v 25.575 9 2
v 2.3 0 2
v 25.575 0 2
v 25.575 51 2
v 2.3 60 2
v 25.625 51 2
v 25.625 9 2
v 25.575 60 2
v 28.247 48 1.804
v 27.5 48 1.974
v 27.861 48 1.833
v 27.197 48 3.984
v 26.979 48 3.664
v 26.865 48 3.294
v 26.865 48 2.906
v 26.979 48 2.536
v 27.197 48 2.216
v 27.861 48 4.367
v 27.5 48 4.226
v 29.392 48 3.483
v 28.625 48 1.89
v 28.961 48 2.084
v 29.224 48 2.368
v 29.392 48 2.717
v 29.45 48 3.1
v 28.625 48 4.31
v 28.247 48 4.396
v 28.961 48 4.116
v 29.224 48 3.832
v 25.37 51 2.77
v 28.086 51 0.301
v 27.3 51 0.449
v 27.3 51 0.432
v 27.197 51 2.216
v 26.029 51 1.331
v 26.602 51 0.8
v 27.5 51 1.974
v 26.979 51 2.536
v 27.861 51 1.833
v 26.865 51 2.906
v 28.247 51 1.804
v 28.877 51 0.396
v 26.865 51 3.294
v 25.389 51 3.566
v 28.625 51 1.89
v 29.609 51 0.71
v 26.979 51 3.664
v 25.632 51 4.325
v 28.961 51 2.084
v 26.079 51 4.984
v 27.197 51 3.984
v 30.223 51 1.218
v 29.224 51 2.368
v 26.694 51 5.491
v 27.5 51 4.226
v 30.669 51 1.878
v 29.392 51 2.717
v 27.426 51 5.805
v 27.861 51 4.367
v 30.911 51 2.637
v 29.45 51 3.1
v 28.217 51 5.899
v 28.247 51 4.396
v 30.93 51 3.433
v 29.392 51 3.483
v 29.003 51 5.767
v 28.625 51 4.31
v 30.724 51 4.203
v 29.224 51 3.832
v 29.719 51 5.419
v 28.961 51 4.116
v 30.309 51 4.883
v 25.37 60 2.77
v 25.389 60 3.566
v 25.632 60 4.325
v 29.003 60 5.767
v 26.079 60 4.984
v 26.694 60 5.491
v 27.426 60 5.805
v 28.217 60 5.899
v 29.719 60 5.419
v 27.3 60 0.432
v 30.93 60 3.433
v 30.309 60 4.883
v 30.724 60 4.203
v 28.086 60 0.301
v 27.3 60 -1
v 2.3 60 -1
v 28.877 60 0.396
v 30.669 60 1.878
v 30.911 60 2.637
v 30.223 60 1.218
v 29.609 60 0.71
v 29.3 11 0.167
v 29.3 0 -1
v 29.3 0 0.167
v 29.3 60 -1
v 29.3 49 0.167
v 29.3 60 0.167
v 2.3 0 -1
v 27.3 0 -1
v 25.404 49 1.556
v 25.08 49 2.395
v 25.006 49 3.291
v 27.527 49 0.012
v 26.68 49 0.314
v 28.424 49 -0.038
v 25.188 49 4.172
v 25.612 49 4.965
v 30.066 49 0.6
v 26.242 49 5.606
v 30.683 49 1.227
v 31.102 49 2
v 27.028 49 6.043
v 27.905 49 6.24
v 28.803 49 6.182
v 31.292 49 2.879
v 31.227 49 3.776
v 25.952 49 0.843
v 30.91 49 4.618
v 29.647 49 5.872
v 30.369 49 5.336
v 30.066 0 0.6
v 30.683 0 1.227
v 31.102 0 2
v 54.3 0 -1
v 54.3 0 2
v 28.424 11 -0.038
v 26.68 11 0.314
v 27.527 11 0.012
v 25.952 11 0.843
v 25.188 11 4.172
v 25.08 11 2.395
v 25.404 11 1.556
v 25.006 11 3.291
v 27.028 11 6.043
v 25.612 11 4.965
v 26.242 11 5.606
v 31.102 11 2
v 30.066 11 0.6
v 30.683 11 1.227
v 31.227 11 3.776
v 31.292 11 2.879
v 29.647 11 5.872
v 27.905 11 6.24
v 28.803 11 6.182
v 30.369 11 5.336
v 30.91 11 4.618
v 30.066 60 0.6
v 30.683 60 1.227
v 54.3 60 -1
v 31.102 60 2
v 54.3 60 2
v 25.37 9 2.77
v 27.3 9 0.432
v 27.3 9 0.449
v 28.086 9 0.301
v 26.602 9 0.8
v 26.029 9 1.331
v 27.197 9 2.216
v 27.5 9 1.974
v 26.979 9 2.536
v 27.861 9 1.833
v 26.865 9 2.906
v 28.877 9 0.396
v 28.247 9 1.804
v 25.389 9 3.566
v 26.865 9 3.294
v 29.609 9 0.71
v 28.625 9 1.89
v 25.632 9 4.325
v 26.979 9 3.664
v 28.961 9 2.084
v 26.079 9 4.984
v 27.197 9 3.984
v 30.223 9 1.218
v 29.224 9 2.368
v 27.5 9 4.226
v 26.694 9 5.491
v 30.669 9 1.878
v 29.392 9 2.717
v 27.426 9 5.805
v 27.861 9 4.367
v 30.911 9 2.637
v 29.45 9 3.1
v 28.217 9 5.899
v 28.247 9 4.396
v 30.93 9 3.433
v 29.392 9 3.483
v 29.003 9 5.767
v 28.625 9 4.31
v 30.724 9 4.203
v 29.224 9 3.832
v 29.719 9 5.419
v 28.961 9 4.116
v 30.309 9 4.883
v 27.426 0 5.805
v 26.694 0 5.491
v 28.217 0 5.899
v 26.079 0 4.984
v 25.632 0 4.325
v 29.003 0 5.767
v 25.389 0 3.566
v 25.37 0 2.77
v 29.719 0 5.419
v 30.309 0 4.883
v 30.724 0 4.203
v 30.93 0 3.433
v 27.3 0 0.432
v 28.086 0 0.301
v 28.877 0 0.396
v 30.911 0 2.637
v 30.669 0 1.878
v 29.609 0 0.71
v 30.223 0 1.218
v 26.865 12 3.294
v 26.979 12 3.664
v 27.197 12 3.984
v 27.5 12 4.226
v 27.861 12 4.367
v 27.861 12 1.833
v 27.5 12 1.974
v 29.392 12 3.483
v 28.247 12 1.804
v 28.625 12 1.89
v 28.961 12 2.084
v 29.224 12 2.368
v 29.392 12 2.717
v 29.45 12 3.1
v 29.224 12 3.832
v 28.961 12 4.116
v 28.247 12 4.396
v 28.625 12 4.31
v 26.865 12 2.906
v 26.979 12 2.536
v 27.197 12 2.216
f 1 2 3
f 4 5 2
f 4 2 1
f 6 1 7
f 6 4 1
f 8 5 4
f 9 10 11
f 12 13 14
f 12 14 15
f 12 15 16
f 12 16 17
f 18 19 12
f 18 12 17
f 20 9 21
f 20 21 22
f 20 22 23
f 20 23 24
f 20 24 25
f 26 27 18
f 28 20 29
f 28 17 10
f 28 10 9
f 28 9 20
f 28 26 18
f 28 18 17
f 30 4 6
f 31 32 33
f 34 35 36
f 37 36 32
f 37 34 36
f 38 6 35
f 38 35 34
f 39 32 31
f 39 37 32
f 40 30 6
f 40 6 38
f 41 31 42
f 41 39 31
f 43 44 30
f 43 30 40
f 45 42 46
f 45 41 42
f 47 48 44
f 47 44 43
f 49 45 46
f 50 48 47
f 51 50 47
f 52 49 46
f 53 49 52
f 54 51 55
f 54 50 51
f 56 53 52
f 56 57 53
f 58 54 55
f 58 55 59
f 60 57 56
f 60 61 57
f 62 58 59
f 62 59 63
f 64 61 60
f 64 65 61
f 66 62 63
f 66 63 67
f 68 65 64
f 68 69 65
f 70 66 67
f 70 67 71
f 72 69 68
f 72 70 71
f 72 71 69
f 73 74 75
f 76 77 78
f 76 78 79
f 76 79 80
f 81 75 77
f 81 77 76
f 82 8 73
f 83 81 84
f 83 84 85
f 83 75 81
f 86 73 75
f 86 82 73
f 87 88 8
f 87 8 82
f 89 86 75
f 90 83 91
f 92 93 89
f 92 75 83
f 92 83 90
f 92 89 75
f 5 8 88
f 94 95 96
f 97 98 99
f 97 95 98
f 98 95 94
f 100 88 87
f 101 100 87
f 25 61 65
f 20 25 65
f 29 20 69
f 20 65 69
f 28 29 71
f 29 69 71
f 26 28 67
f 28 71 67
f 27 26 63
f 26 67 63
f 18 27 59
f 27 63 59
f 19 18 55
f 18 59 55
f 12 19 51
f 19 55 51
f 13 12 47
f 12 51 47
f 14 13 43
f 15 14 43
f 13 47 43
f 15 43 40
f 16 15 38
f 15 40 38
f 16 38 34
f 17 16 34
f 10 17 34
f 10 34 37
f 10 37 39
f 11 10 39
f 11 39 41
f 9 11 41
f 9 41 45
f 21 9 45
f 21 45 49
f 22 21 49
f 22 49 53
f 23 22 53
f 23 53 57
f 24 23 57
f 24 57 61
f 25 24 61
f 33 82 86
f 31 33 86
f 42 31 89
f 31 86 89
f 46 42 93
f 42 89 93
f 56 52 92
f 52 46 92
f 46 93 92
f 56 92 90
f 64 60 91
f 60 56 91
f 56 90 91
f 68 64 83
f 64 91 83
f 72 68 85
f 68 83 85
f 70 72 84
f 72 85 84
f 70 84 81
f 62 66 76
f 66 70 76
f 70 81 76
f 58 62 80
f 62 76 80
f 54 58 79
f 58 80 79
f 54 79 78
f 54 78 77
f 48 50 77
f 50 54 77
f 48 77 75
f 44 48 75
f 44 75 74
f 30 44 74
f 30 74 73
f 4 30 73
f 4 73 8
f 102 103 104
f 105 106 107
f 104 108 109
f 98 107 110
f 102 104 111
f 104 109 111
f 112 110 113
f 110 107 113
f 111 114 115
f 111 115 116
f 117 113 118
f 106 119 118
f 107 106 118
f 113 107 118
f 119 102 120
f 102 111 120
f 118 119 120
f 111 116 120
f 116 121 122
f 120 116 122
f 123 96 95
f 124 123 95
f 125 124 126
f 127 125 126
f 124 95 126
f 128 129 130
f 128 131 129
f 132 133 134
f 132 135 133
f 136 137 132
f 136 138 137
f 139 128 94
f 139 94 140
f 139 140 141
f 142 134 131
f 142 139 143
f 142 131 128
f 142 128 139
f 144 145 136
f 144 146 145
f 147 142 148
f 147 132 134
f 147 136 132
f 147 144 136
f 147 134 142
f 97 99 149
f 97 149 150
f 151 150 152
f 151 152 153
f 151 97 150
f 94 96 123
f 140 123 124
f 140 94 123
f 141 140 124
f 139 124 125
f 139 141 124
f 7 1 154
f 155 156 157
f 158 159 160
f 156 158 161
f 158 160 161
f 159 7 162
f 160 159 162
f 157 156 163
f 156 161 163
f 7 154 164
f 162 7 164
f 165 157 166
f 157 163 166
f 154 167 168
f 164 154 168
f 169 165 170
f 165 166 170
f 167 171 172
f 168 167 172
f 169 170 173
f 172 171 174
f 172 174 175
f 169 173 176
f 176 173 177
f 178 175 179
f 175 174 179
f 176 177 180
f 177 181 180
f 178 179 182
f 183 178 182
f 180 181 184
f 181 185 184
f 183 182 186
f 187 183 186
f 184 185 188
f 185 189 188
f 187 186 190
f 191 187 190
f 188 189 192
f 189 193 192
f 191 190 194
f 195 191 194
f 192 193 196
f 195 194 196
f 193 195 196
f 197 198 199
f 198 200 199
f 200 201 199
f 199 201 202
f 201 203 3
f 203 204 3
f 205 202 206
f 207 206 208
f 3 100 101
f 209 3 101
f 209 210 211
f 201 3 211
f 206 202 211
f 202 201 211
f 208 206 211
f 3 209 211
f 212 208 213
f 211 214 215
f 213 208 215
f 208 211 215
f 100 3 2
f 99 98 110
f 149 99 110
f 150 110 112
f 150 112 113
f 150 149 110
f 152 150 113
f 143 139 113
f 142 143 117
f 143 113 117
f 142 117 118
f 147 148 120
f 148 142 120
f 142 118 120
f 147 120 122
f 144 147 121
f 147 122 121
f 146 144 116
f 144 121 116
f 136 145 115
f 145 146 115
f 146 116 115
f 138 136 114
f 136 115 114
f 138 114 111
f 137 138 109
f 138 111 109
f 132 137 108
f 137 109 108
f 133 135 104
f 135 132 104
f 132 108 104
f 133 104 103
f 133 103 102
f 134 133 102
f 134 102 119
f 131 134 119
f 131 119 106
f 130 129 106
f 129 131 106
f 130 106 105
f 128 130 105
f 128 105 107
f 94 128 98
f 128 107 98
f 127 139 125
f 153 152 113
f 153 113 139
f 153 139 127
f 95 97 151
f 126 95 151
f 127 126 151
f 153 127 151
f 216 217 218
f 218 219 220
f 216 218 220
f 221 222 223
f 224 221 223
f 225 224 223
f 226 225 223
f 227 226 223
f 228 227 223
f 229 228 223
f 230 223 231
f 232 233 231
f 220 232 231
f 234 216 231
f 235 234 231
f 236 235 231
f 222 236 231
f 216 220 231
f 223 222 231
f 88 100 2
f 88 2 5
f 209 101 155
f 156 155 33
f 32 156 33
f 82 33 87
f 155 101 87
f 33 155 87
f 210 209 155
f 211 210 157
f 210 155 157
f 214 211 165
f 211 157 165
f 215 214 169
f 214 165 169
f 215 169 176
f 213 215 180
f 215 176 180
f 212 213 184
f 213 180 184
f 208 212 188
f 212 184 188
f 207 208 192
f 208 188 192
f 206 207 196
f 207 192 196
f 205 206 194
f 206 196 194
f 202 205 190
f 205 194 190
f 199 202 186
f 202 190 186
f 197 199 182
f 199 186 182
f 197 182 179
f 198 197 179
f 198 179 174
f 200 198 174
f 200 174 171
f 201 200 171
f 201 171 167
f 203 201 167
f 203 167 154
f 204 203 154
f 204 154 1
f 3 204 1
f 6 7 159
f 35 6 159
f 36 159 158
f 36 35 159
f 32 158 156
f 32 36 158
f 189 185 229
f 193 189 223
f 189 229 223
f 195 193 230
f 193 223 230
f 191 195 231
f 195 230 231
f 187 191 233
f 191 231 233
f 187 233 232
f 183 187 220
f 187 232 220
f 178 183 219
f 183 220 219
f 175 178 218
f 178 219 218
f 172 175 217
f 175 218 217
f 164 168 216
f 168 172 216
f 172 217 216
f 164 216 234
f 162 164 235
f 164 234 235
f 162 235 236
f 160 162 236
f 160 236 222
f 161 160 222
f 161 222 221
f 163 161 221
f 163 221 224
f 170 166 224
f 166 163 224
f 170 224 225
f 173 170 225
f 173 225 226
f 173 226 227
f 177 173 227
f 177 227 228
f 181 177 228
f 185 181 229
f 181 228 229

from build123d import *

# Parameters (mm, degrees)
CYLINDER007_R               = 1.3
CYLINDER007_DEPTH           = 12
CYLINDER007_ROLL_ANGLE      = 90
CYLINDER005_R               = 2.8
CYLINDER005_DEPTH           = 9
CYLINDER005_ROLL_ANGLE      = 90
CYLINDER003_R               = 2.8
CYLINDER003_DEPTH           = 60
CYLINDER003_ROLL_ANGLE      = 90
BOX_W                       = 25
BOX_H                       = 60
BOX_DEPTH                   = 3
CYLINDER004_R               = 2.8
CYLINDER004_DEPTH           = 9
CYLINDER004_ROLL_ANGLE      = 90
CYLINDER006_R               = 1.3
CYLINDER006_DEPTH           = 12
CYLINDER006_ROLL_ANGLE      = 90
CYLINDER001_R               = 1.5
CYLINDER001_DEPTH           = 38
CYLINDER001_ROLL_ANGLE      = -0.287004
CYLINDER001_PITCH_ANGLE     = 73.550491
CYLINDER001_PLACEMENT_ANGLE = -9.744548
CYLINDER_R                  = 3.15
CYLINDER_DEPTH              = 38
CYLINDER_ROLL_ANGLE         = 90
CYLINDER002_R               = 3.15
CYLINDER002_DEPTH           = 60
CYLINDER002_ROLL_ANGLE      = 90
BOX001_W                    = 25
BOX001_H                    = 60
BOX001_DEPTH                = 3


with BuildPart() as cylinder007:
    # Cylinder007 → Cylinder007 (new body)
    with BuildSketch(Plane.XY):
        Circle(CYLINDER007_R)
    extrude(amount=CYLINDER007_DEPTH)


with BuildPart() as cylinder007_1:
    # Cylinder007 roll: moved
    add(cylinder007.part.rotate(Axis((0, 0, 0), (1, 0, 0)), CYLINDER007_ROLL_ANGLE))


with BuildPart() as cylinder007_2:
    # Cylinder007 placement: moved
    add(cylinder007_1.part.moved(Location((28.15, 60, 3.1))))


with BuildPart() as fusion:
    # Cylinder005 → Cylinder005 (new body)
    with BuildSketch(Plane.XY):
        Circle(CYLINDER005_R)
    extrude(amount=CYLINDER005_DEPTH)


with BuildPart() as fusion_1:
    # Cylinder005 roll: moved
    add(fusion.part.rotate(Axis((0, 0, 0), (1, 0, 0)), CYLINDER005_ROLL_ANGLE))


with BuildPart() as fusion_2:
    # Cylinder005 placement: moved
    add(fusion_1.part.moved(Location((28.15, 60, 3.1))))

    # Fusion: union Cylinder007
    add(cylinder007_2.part)


with BuildPart() as cylinder003:
    # Cylinder003 → Cylinder003 (new body)
    with BuildSketch(Plane.XY):
        Circle(CYLINDER003_R)
    extrude(amount=CYLINDER003_DEPTH)


with BuildPart() as cylinder003_1:
    # Cylinder003 roll: moved
    add(cylinder003.part.rotate(Axis((0, 0, 0), (1, 0, 0)), CYLINDER003_ROLL_ANGLE))


with BuildPart() as cylinder003_2:
    # Cylinder003 placement: moved
    add(cylinder003_1.part.moved(Location((28.2, 60, 3.1))))


with BuildPart() as cut002:
    # Box → Box (new body)
    with BuildSketch(Plane(origin=(2.3, 0, -1), x_dir=(1, 0, 0), z_dir=(0, 0, 1))):
        with Locations((12.5, 30)):
            Rectangle(BOX_W, BOX_H)
    extrude(amount=BOX_DEPTH)

    # Cut002: cut Cylinder003
    add(cylinder003_2.part, mode=Mode.SUBTRACT)


with BuildPart() as cylinder004:
    # Cylinder004 → Cylinder004 (new body)
    with BuildSketch(Plane.XY):
        Circle(CYLINDER004_R)
    extrude(amount=CYLINDER004_DEPTH)


with BuildPart() as cylinder004_1:
    # Cylinder004 roll: moved
    add(cylinder004.part.rotate(Axis((0, 0, 0), (1, 0, 0)), CYLINDER004_ROLL_ANGLE))


with BuildPart() as cylinder004_2:
    # Cylinder004 placement: moved
    add(cylinder004_1.part.moved(Location((28.15, 9, 3.1))))


with BuildPart() as fusion002:
    # Cylinder006 → Cylinder006 (new body)
    with BuildSketch(Plane.XY):
        Circle(CYLINDER006_R)
    extrude(amount=CYLINDER006_DEPTH)


with BuildPart() as fusion002_1:
    # Cylinder006 roll: moved
    add(fusion002.part.rotate(Axis((0, 0, 0), (1, 0, 0)), CYLINDER006_ROLL_ANGLE))


with BuildPart() as fusion002_2:
    # Cylinder006 placement: moved
    add(fusion002_1.part.moved(Location((28.15, 12, 3.1))))

    # Fusion001: union Cylinder004
    add(cylinder004_2.part)

    # Fusion002: union Fusion, Cut002
    add(fusion_2.part)
    add(cut002.part)


with BuildPart() as cylinder001:
    # Cylinder001 → Cylinder001 (new body)
    with BuildSketch(Plane.XY):
        Circle(CYLINDER001_R)
    extrude(amount=CYLINDER001_DEPTH)


with BuildPart() as cylinder001_1:
    # Cylinder001 roll: moved
    add(cylinder001.part.rotate(Axis((0, 0, 0), (1, 0, 0)), CYLINDER001_ROLL_ANGLE))


with BuildPart() as cylinder001_2:
    # Cylinder001 pitch: moved
    add(cylinder001_1.part.rotate(Axis((0, 0, 0), (0, 1, 0)), CYLINDER001_PITCH_ANGLE))


with BuildPart() as cylinder001_3:
    # Cylinder001 placement: moved
    add(cylinder001_2.part.moved(Location((77.098368, 2.919036, 17.796417))).rotate(Axis((77.098368, 2.919036, 17.796417), (0, 0, 1)), CYLINDER001_PLACEMENT_ANGLE))


with BuildPart() as cut001:
    # Cylinder → Cylinder (new body)
    with BuildSketch(Plane.XY):
        Circle(CYLINDER_R)
    extrude(amount=CYLINDER_DEPTH)


with BuildPart() as cut001_1:
    # Cylinder roll: moved
    add(cut001.part.rotate(Axis((0, 0, 0), (1, 0, 0)), CYLINDER_ROLL_ANGLE))


with BuildPart() as cut001_2:
    # Cylinder placement: moved
    add(cut001_1.part.moved(Location((28.15, 49, 3.1))))

    # Cut001: cut Cylinder001
    add(cylinder001_3.part, mode=Mode.SUBTRACT)


with BuildPart() as cylinder002:
    # Cylinder002 → Cylinder002 (new body)
    with BuildSketch(Plane.XY):
        Circle(CYLINDER002_R)
    extrude(amount=CYLINDER002_DEPTH)


with BuildPart() as cylinder002_1:
    # Cylinder002 roll: moved
    add(cylinder002.part.rotate(Axis((0, 0, 0), (1, 0, 0)), CYLINDER002_ROLL_ANGLE))


with BuildPart() as cylinder002_2:
    # Cylinder002 placement: moved
    add(cylinder002_1.part.moved(Location((28.15, 60, 3.1))))


with BuildPart() as fusion003:
    # Box001 → Box001 (new body)
    with BuildSketch(Plane(origin=(29.3, 0, -1), x_dir=(1, 0, 0), z_dir=(0, 0, 1))):
        with Locations((12.5, 30)):
            Rectangle(BOX001_W, BOX001_H)
    extrude(amount=BOX001_DEPTH)

    # Cut: cut Cylinder002
    add(cylinder002_2.part, mode=Mode.SUBTRACT)

    # Fusion003: union Cut001
    add(cut001_2.part)


solid = Compound([fusion002_2.part, fusion003.part])
